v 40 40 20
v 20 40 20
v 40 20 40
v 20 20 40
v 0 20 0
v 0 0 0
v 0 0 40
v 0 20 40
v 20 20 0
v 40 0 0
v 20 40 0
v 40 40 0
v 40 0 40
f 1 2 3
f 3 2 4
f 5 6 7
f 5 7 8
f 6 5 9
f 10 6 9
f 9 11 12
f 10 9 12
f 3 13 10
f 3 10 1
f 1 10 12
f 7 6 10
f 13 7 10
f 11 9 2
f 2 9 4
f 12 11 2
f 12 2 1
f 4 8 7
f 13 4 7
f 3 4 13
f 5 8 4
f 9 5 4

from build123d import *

# Parameters (mm, degrees)
SKETCH1_W           = 40
SKETCH1_H           = 40
BOSS_EXTRUDE1_DEPTH = 40
SKETCH2_W           = 20
SKETCH2_H           = 20
CUT_EXTRUDE1_DEPTH  = 40
CUT_EXTRUDE2_DEPTH  = 40


with BuildPart() as part:
    # Sketch1 → Boss-Extrude1 (new body)
    with BuildSketch(Plane.XY):
        with Locations((20, 20)):
            Rectangle(SKETCH1_W, SKETCH1_H)
    extrude(amount=BOSS_EXTRUDE1_DEPTH)

    # Sketch2 → Cut-Extrude1 (cut)
    with BuildSketch(Plane.XY.offset(40)):
        with Locations((10, 30)):
            Rectangle(SKETCH2_W, SKETCH2_H)
    extrude(amount=-CUT_EXTRUDE1_DEPTH, mode=Mode.SUBTRACT)

    # Sketch3 → Cut-Extrude2 (cut)
    with BuildSketch(Plane.ZY.offset(-20)):
        Polygon((20, 40), (40, 20), (40, 40), align=None)
    extrude(amount=-CUT_EXTRUDE2_DEPTH, mode=Mode.SUBTRACT)


solid = part.part
